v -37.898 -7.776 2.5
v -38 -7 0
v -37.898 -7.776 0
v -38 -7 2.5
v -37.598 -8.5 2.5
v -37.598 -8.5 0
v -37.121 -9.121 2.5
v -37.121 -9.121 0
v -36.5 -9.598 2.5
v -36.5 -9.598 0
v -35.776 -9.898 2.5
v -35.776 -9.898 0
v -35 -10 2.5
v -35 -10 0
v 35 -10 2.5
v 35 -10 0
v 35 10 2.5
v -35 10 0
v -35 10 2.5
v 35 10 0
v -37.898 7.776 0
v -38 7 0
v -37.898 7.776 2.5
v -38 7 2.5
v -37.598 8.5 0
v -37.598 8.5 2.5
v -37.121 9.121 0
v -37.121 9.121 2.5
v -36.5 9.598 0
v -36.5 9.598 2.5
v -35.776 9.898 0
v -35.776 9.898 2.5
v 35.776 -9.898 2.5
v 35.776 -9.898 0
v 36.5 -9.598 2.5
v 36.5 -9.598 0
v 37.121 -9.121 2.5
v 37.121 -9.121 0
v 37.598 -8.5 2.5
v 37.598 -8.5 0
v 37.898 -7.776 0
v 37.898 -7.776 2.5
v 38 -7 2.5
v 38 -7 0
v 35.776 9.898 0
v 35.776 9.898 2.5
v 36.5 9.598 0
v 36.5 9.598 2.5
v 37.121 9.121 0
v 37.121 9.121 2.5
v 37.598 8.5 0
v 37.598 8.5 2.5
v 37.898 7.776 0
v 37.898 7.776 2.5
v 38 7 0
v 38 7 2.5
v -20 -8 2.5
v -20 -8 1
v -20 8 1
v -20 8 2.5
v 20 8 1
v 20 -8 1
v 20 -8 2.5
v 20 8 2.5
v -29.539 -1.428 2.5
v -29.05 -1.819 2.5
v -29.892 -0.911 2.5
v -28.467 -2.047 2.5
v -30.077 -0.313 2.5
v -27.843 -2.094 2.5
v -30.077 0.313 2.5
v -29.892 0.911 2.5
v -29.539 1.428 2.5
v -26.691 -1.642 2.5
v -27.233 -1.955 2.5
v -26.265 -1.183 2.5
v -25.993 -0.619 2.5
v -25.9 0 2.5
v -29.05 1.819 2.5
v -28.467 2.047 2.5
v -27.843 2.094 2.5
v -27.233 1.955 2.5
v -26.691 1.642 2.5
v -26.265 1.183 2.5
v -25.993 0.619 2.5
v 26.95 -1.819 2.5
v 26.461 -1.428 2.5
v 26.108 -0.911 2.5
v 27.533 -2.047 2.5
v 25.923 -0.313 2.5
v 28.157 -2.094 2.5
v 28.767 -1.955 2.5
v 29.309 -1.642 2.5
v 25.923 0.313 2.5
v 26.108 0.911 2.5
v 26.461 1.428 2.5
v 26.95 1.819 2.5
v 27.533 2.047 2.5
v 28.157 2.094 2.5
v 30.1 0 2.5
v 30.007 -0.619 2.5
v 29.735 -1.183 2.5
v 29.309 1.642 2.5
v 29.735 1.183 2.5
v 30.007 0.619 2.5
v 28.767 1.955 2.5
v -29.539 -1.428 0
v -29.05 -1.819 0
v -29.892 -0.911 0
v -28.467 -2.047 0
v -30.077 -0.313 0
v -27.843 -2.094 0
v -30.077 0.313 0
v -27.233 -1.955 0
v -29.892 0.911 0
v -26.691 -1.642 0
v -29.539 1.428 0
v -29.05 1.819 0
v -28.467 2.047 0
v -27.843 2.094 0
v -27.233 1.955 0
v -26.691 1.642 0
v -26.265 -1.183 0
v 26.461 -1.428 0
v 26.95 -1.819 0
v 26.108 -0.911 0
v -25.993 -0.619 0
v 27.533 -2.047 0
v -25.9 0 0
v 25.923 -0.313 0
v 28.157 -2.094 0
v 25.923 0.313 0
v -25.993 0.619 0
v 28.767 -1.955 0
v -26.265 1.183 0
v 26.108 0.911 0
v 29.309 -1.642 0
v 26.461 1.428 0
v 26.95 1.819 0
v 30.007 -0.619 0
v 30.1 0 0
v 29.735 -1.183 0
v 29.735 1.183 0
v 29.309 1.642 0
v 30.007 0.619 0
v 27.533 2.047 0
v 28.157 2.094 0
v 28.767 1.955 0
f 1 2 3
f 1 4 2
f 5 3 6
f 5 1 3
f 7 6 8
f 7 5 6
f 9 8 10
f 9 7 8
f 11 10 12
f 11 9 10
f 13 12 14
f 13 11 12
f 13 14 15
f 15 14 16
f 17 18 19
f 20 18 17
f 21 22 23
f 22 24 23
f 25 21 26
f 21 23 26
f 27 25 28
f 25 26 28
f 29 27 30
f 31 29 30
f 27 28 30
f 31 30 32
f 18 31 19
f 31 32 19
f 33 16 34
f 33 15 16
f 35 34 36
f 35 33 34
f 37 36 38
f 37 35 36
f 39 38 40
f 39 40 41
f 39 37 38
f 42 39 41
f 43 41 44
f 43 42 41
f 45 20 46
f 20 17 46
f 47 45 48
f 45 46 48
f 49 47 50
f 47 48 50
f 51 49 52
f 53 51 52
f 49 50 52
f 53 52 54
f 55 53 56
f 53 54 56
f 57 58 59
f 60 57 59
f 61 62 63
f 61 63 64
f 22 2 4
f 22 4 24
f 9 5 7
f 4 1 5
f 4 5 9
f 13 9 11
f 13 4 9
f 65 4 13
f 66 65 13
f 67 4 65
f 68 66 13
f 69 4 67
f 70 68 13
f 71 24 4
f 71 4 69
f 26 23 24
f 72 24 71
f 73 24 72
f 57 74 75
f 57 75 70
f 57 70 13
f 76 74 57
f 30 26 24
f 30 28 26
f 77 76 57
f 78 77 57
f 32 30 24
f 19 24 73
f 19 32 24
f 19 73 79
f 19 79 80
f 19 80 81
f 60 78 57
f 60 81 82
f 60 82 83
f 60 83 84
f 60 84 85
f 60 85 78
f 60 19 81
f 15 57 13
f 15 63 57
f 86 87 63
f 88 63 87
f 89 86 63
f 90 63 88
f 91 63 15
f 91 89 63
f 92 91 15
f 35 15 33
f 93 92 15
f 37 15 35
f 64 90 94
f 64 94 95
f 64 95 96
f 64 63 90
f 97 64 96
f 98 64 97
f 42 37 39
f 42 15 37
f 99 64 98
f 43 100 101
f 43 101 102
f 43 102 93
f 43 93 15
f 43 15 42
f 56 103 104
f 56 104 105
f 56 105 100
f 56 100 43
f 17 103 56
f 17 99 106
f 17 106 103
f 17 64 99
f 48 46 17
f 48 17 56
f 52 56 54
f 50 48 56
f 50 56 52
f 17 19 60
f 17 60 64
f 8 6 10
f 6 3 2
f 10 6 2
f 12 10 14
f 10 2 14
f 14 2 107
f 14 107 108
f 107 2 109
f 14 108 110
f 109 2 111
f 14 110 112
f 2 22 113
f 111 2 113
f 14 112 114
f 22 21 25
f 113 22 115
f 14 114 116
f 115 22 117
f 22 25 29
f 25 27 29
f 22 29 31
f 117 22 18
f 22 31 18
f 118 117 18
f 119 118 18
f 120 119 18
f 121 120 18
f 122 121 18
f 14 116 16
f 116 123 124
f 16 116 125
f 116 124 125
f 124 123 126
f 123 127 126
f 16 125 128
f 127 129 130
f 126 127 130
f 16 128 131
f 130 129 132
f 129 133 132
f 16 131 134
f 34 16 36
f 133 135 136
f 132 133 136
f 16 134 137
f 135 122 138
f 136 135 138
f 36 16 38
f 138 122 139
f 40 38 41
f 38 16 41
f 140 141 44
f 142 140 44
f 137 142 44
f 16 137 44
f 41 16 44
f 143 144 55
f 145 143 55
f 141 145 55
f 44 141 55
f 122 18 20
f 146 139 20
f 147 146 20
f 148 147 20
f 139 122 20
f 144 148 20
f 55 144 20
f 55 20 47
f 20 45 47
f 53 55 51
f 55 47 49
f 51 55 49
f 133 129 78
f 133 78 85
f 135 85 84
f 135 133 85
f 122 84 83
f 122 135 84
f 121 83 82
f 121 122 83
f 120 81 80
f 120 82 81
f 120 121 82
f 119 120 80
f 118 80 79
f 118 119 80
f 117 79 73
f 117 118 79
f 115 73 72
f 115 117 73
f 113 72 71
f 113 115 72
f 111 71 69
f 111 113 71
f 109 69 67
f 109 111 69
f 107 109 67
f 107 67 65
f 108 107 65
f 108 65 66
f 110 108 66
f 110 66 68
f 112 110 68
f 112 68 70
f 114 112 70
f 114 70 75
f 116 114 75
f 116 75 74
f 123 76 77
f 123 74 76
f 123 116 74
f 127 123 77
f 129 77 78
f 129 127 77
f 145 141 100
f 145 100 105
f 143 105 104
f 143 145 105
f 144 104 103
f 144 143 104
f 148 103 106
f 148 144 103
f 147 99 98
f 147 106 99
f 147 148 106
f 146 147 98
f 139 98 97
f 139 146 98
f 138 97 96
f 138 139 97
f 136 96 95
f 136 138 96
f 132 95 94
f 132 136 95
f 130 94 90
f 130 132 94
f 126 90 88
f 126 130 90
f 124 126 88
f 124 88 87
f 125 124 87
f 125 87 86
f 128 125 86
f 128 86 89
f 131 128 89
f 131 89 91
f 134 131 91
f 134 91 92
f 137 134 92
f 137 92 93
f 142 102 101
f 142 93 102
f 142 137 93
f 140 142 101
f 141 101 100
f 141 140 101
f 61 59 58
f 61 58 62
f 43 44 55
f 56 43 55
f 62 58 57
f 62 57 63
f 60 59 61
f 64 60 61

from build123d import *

# Parameters (mm, degrees)
CYLINDER002_R     = 2.1
CYLINDER002_DEPTH = 10
CYLINDER001_R     = 2.1
CYLINDER001_DEPTH = 10
BOX012_W          = 40
BOX012_H          = 16
BOX012_DEPTH      = 2.5
BOX011_W          = 76
BOX011_H          = 20
BOX011_DEPTH      = 2.5
FILLET014_R       = 3


with BuildPart() as cylinder002:
    # Cylinder002 → Cylinder002 (new body)
    with BuildSketch(Plane(origin=(28, 0, -2), x_dir=(1, 0, 0), z_dir=(0, 0, 1))):
        Circle(CYLINDER002_R)
    extrude(amount=CYLINDER002_DEPTH)


with BuildPart() as fusion005:
    # Cylinder001 → Cylinder001 (new body)
    with BuildSketch(Plane(origin=(-28, 0, -2), x_dir=(1, 0, 0), z_dir=(0, 0, 1))):
        Circle(CYLINDER001_R)
    extrude(amount=CYLINDER001_DEPTH)

    # Fusion005: union Cylinder002
    add(cylinder002.part)


with BuildPart() as cube012:
    # Box012 → Box012 (new body)
    with BuildSketch(Plane(origin=(-20, -8, 1), x_dir=(1, 0, 0), z_dir=(0, 0, 1))):
        with Locations((20, 8)):
            Rectangle(BOX012_W, BOX012_H)
    extrude(amount=BOX012_DEPTH)


with BuildPart() as cut017:
    # Box011 → Box011 (new body)
    with BuildSketch(Plane(origin=(-38, -10, 0), x_dir=(1, 0, 0), z_dir=(0, 0, 1))):
        with Locations((38, 10)):
            Rectangle(BOX011_W, BOX011_H)
    extrude(amount=BOX011_DEPTH)

    # Cut016: cut Cube012
    add(cube012.part, mode=Mode.SUBTRACT)

    # Fillet014
    fillet014_edges = [cut017.edges().sort_by_distance(p)[0] for p in [
        (-38, -10, 1.25),
        (-38, 10, 1.25),
        (38, -10, 1.25),
        (38, 10, 1.25),
    ]]
    fillet(fillet014_edges, radius=FILLET014_R)

    # Cut017: cut Fusion005
    add(fusion005.part, mode=Mode.SUBTRACT)


solid = cut017.part
